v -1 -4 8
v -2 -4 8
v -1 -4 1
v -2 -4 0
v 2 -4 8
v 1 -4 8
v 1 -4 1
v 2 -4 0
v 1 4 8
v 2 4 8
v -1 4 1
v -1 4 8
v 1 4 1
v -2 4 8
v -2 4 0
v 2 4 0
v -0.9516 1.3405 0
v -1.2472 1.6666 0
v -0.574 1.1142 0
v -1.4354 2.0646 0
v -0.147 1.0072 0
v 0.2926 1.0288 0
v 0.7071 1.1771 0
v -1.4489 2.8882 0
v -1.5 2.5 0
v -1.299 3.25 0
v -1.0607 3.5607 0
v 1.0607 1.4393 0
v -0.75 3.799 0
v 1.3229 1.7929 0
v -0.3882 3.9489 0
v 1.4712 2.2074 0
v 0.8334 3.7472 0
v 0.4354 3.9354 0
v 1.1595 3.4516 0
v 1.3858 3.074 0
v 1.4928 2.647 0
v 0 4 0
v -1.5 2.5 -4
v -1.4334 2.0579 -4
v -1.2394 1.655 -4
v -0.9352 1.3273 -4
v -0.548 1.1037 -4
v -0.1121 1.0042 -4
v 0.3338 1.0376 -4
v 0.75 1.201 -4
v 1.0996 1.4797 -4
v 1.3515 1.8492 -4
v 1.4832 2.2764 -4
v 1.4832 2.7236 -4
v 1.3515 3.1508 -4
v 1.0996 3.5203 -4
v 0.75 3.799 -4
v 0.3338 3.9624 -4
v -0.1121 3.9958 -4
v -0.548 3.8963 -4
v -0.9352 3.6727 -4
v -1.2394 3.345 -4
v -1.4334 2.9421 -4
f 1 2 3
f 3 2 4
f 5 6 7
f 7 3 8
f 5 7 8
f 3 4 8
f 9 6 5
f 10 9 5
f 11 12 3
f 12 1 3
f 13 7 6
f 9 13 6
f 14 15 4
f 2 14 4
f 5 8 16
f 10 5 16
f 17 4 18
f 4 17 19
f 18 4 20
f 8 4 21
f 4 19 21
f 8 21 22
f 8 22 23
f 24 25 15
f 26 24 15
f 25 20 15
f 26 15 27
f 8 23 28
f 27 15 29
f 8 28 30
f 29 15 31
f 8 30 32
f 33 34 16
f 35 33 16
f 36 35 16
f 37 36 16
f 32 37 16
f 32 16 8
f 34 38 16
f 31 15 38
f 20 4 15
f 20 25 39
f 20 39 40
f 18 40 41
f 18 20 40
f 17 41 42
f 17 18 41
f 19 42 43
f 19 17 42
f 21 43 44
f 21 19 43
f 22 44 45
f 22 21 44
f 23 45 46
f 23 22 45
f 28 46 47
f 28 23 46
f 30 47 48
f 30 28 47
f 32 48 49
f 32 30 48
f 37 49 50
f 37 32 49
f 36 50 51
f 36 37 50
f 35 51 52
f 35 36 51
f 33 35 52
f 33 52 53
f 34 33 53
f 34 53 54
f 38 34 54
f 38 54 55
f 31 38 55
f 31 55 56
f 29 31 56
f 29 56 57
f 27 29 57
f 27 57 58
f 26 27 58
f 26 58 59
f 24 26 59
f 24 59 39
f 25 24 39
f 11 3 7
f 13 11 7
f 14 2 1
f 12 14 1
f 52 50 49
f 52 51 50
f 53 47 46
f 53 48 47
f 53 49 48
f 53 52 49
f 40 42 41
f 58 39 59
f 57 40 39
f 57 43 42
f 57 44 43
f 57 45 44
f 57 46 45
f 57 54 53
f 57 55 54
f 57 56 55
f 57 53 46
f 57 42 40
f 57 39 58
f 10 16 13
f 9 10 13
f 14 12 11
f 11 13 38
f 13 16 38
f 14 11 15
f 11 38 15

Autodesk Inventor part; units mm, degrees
ref_plane "YZ Plane" through (0, 0, 0) normal (1, 0, 0) x (0, 1, 0)
ref_plane "XZ Plane" through (0, 0, 0) normal (0, 1, 0) x (-1, 0, 0)
ref_plane "XY Plane" through (0, 0, 0) normal (0, 0, 1) x (1, 0, 0)
sketch "Body_Skt" plane through (0, 0, 0) normal (0, 0, 1) x (1, 0, 0)
  line L0 (-2, -4) -> (2, -4)
  line L1 (2, -4) -> (2, 4)
  line L2 (2, 4) -> (-2, 4)
  line L3 (-2, 4) -> (-2, -4)
  line L4 (-2, -4) -> (2, 4) construction
  line L5 (2, -4) -> (-2, 4) construction
  point P0 (0, 0)
  dimension "d0" = 4
  dimension "d1" = 8
extrude "Body" add sketch "Body_Skt" along normal blind 8
sketch "Wall_Skt" plane through (-2, -4, 0) normal (0, -1, 0) x (1, 0, 0)
  line L0 (0, 8) -> (4, 8) projected
  line L1 (3, 8) -> (1, 8)
  line L2 (1, 8) -> (1, 1)
  line L3 (1, 1) -> (3, 1)
  line L4 (3, 1) -> (3, 8)
  line L5 (4, 0) -> (4, 8) projected
  line L6 (0, 0) -> (4, 0) projected
  line L7 (0, 0) -> (0, 8) projected
  point P0 (2, 0)
  dimension "d4" = 1
  dimension "d5" = 1
  dimension "d6" = 1
extrude "Wall" cut sketch "Wall_Skt" against normal through all contours L0 L4 L3 L2
sketch "Leg_Skt" plane through (0, 0, 0) normal (0, 0, -1) x (-1, 0, 0)
  circle A0 centre (0, 2.5) radius 1.5
  line L0 (-2, 4) -> (2, 4) projected
  line L1 (0, 0) -> (0, 4) construction
  dimension "d10" = 3
extrude "Leg" add sketch "Leg_Skt" along normal blind 4
equation "\"d0\" = wall_inner_diam + 2 * wall_outer_diam"
equation "\"d1\" = wall_widh"
equation "\"d2\" = wall_height"
equation "\"d4\" = wall_outer_diam"
equation "\"d5\" = wall_outer_diam"
equation "\"d6\" = wall_outer_diam"
equation "\"d7\" = d1 - wall_outer_diam"
equation "\"d10\" = leg_diam"
equation "\"d11\" = leg_height"
equation "\"wall_inner_diam\" = 2"
equation "\"wall_outer_diam\" = 1"
equation "\"wall_height\" = 8"
equation "\"leg_diam\" = 3"
equation "\"leg_height\" = 4"
equation "\"wall_widh\" = 8"
properties part number "coffee"
